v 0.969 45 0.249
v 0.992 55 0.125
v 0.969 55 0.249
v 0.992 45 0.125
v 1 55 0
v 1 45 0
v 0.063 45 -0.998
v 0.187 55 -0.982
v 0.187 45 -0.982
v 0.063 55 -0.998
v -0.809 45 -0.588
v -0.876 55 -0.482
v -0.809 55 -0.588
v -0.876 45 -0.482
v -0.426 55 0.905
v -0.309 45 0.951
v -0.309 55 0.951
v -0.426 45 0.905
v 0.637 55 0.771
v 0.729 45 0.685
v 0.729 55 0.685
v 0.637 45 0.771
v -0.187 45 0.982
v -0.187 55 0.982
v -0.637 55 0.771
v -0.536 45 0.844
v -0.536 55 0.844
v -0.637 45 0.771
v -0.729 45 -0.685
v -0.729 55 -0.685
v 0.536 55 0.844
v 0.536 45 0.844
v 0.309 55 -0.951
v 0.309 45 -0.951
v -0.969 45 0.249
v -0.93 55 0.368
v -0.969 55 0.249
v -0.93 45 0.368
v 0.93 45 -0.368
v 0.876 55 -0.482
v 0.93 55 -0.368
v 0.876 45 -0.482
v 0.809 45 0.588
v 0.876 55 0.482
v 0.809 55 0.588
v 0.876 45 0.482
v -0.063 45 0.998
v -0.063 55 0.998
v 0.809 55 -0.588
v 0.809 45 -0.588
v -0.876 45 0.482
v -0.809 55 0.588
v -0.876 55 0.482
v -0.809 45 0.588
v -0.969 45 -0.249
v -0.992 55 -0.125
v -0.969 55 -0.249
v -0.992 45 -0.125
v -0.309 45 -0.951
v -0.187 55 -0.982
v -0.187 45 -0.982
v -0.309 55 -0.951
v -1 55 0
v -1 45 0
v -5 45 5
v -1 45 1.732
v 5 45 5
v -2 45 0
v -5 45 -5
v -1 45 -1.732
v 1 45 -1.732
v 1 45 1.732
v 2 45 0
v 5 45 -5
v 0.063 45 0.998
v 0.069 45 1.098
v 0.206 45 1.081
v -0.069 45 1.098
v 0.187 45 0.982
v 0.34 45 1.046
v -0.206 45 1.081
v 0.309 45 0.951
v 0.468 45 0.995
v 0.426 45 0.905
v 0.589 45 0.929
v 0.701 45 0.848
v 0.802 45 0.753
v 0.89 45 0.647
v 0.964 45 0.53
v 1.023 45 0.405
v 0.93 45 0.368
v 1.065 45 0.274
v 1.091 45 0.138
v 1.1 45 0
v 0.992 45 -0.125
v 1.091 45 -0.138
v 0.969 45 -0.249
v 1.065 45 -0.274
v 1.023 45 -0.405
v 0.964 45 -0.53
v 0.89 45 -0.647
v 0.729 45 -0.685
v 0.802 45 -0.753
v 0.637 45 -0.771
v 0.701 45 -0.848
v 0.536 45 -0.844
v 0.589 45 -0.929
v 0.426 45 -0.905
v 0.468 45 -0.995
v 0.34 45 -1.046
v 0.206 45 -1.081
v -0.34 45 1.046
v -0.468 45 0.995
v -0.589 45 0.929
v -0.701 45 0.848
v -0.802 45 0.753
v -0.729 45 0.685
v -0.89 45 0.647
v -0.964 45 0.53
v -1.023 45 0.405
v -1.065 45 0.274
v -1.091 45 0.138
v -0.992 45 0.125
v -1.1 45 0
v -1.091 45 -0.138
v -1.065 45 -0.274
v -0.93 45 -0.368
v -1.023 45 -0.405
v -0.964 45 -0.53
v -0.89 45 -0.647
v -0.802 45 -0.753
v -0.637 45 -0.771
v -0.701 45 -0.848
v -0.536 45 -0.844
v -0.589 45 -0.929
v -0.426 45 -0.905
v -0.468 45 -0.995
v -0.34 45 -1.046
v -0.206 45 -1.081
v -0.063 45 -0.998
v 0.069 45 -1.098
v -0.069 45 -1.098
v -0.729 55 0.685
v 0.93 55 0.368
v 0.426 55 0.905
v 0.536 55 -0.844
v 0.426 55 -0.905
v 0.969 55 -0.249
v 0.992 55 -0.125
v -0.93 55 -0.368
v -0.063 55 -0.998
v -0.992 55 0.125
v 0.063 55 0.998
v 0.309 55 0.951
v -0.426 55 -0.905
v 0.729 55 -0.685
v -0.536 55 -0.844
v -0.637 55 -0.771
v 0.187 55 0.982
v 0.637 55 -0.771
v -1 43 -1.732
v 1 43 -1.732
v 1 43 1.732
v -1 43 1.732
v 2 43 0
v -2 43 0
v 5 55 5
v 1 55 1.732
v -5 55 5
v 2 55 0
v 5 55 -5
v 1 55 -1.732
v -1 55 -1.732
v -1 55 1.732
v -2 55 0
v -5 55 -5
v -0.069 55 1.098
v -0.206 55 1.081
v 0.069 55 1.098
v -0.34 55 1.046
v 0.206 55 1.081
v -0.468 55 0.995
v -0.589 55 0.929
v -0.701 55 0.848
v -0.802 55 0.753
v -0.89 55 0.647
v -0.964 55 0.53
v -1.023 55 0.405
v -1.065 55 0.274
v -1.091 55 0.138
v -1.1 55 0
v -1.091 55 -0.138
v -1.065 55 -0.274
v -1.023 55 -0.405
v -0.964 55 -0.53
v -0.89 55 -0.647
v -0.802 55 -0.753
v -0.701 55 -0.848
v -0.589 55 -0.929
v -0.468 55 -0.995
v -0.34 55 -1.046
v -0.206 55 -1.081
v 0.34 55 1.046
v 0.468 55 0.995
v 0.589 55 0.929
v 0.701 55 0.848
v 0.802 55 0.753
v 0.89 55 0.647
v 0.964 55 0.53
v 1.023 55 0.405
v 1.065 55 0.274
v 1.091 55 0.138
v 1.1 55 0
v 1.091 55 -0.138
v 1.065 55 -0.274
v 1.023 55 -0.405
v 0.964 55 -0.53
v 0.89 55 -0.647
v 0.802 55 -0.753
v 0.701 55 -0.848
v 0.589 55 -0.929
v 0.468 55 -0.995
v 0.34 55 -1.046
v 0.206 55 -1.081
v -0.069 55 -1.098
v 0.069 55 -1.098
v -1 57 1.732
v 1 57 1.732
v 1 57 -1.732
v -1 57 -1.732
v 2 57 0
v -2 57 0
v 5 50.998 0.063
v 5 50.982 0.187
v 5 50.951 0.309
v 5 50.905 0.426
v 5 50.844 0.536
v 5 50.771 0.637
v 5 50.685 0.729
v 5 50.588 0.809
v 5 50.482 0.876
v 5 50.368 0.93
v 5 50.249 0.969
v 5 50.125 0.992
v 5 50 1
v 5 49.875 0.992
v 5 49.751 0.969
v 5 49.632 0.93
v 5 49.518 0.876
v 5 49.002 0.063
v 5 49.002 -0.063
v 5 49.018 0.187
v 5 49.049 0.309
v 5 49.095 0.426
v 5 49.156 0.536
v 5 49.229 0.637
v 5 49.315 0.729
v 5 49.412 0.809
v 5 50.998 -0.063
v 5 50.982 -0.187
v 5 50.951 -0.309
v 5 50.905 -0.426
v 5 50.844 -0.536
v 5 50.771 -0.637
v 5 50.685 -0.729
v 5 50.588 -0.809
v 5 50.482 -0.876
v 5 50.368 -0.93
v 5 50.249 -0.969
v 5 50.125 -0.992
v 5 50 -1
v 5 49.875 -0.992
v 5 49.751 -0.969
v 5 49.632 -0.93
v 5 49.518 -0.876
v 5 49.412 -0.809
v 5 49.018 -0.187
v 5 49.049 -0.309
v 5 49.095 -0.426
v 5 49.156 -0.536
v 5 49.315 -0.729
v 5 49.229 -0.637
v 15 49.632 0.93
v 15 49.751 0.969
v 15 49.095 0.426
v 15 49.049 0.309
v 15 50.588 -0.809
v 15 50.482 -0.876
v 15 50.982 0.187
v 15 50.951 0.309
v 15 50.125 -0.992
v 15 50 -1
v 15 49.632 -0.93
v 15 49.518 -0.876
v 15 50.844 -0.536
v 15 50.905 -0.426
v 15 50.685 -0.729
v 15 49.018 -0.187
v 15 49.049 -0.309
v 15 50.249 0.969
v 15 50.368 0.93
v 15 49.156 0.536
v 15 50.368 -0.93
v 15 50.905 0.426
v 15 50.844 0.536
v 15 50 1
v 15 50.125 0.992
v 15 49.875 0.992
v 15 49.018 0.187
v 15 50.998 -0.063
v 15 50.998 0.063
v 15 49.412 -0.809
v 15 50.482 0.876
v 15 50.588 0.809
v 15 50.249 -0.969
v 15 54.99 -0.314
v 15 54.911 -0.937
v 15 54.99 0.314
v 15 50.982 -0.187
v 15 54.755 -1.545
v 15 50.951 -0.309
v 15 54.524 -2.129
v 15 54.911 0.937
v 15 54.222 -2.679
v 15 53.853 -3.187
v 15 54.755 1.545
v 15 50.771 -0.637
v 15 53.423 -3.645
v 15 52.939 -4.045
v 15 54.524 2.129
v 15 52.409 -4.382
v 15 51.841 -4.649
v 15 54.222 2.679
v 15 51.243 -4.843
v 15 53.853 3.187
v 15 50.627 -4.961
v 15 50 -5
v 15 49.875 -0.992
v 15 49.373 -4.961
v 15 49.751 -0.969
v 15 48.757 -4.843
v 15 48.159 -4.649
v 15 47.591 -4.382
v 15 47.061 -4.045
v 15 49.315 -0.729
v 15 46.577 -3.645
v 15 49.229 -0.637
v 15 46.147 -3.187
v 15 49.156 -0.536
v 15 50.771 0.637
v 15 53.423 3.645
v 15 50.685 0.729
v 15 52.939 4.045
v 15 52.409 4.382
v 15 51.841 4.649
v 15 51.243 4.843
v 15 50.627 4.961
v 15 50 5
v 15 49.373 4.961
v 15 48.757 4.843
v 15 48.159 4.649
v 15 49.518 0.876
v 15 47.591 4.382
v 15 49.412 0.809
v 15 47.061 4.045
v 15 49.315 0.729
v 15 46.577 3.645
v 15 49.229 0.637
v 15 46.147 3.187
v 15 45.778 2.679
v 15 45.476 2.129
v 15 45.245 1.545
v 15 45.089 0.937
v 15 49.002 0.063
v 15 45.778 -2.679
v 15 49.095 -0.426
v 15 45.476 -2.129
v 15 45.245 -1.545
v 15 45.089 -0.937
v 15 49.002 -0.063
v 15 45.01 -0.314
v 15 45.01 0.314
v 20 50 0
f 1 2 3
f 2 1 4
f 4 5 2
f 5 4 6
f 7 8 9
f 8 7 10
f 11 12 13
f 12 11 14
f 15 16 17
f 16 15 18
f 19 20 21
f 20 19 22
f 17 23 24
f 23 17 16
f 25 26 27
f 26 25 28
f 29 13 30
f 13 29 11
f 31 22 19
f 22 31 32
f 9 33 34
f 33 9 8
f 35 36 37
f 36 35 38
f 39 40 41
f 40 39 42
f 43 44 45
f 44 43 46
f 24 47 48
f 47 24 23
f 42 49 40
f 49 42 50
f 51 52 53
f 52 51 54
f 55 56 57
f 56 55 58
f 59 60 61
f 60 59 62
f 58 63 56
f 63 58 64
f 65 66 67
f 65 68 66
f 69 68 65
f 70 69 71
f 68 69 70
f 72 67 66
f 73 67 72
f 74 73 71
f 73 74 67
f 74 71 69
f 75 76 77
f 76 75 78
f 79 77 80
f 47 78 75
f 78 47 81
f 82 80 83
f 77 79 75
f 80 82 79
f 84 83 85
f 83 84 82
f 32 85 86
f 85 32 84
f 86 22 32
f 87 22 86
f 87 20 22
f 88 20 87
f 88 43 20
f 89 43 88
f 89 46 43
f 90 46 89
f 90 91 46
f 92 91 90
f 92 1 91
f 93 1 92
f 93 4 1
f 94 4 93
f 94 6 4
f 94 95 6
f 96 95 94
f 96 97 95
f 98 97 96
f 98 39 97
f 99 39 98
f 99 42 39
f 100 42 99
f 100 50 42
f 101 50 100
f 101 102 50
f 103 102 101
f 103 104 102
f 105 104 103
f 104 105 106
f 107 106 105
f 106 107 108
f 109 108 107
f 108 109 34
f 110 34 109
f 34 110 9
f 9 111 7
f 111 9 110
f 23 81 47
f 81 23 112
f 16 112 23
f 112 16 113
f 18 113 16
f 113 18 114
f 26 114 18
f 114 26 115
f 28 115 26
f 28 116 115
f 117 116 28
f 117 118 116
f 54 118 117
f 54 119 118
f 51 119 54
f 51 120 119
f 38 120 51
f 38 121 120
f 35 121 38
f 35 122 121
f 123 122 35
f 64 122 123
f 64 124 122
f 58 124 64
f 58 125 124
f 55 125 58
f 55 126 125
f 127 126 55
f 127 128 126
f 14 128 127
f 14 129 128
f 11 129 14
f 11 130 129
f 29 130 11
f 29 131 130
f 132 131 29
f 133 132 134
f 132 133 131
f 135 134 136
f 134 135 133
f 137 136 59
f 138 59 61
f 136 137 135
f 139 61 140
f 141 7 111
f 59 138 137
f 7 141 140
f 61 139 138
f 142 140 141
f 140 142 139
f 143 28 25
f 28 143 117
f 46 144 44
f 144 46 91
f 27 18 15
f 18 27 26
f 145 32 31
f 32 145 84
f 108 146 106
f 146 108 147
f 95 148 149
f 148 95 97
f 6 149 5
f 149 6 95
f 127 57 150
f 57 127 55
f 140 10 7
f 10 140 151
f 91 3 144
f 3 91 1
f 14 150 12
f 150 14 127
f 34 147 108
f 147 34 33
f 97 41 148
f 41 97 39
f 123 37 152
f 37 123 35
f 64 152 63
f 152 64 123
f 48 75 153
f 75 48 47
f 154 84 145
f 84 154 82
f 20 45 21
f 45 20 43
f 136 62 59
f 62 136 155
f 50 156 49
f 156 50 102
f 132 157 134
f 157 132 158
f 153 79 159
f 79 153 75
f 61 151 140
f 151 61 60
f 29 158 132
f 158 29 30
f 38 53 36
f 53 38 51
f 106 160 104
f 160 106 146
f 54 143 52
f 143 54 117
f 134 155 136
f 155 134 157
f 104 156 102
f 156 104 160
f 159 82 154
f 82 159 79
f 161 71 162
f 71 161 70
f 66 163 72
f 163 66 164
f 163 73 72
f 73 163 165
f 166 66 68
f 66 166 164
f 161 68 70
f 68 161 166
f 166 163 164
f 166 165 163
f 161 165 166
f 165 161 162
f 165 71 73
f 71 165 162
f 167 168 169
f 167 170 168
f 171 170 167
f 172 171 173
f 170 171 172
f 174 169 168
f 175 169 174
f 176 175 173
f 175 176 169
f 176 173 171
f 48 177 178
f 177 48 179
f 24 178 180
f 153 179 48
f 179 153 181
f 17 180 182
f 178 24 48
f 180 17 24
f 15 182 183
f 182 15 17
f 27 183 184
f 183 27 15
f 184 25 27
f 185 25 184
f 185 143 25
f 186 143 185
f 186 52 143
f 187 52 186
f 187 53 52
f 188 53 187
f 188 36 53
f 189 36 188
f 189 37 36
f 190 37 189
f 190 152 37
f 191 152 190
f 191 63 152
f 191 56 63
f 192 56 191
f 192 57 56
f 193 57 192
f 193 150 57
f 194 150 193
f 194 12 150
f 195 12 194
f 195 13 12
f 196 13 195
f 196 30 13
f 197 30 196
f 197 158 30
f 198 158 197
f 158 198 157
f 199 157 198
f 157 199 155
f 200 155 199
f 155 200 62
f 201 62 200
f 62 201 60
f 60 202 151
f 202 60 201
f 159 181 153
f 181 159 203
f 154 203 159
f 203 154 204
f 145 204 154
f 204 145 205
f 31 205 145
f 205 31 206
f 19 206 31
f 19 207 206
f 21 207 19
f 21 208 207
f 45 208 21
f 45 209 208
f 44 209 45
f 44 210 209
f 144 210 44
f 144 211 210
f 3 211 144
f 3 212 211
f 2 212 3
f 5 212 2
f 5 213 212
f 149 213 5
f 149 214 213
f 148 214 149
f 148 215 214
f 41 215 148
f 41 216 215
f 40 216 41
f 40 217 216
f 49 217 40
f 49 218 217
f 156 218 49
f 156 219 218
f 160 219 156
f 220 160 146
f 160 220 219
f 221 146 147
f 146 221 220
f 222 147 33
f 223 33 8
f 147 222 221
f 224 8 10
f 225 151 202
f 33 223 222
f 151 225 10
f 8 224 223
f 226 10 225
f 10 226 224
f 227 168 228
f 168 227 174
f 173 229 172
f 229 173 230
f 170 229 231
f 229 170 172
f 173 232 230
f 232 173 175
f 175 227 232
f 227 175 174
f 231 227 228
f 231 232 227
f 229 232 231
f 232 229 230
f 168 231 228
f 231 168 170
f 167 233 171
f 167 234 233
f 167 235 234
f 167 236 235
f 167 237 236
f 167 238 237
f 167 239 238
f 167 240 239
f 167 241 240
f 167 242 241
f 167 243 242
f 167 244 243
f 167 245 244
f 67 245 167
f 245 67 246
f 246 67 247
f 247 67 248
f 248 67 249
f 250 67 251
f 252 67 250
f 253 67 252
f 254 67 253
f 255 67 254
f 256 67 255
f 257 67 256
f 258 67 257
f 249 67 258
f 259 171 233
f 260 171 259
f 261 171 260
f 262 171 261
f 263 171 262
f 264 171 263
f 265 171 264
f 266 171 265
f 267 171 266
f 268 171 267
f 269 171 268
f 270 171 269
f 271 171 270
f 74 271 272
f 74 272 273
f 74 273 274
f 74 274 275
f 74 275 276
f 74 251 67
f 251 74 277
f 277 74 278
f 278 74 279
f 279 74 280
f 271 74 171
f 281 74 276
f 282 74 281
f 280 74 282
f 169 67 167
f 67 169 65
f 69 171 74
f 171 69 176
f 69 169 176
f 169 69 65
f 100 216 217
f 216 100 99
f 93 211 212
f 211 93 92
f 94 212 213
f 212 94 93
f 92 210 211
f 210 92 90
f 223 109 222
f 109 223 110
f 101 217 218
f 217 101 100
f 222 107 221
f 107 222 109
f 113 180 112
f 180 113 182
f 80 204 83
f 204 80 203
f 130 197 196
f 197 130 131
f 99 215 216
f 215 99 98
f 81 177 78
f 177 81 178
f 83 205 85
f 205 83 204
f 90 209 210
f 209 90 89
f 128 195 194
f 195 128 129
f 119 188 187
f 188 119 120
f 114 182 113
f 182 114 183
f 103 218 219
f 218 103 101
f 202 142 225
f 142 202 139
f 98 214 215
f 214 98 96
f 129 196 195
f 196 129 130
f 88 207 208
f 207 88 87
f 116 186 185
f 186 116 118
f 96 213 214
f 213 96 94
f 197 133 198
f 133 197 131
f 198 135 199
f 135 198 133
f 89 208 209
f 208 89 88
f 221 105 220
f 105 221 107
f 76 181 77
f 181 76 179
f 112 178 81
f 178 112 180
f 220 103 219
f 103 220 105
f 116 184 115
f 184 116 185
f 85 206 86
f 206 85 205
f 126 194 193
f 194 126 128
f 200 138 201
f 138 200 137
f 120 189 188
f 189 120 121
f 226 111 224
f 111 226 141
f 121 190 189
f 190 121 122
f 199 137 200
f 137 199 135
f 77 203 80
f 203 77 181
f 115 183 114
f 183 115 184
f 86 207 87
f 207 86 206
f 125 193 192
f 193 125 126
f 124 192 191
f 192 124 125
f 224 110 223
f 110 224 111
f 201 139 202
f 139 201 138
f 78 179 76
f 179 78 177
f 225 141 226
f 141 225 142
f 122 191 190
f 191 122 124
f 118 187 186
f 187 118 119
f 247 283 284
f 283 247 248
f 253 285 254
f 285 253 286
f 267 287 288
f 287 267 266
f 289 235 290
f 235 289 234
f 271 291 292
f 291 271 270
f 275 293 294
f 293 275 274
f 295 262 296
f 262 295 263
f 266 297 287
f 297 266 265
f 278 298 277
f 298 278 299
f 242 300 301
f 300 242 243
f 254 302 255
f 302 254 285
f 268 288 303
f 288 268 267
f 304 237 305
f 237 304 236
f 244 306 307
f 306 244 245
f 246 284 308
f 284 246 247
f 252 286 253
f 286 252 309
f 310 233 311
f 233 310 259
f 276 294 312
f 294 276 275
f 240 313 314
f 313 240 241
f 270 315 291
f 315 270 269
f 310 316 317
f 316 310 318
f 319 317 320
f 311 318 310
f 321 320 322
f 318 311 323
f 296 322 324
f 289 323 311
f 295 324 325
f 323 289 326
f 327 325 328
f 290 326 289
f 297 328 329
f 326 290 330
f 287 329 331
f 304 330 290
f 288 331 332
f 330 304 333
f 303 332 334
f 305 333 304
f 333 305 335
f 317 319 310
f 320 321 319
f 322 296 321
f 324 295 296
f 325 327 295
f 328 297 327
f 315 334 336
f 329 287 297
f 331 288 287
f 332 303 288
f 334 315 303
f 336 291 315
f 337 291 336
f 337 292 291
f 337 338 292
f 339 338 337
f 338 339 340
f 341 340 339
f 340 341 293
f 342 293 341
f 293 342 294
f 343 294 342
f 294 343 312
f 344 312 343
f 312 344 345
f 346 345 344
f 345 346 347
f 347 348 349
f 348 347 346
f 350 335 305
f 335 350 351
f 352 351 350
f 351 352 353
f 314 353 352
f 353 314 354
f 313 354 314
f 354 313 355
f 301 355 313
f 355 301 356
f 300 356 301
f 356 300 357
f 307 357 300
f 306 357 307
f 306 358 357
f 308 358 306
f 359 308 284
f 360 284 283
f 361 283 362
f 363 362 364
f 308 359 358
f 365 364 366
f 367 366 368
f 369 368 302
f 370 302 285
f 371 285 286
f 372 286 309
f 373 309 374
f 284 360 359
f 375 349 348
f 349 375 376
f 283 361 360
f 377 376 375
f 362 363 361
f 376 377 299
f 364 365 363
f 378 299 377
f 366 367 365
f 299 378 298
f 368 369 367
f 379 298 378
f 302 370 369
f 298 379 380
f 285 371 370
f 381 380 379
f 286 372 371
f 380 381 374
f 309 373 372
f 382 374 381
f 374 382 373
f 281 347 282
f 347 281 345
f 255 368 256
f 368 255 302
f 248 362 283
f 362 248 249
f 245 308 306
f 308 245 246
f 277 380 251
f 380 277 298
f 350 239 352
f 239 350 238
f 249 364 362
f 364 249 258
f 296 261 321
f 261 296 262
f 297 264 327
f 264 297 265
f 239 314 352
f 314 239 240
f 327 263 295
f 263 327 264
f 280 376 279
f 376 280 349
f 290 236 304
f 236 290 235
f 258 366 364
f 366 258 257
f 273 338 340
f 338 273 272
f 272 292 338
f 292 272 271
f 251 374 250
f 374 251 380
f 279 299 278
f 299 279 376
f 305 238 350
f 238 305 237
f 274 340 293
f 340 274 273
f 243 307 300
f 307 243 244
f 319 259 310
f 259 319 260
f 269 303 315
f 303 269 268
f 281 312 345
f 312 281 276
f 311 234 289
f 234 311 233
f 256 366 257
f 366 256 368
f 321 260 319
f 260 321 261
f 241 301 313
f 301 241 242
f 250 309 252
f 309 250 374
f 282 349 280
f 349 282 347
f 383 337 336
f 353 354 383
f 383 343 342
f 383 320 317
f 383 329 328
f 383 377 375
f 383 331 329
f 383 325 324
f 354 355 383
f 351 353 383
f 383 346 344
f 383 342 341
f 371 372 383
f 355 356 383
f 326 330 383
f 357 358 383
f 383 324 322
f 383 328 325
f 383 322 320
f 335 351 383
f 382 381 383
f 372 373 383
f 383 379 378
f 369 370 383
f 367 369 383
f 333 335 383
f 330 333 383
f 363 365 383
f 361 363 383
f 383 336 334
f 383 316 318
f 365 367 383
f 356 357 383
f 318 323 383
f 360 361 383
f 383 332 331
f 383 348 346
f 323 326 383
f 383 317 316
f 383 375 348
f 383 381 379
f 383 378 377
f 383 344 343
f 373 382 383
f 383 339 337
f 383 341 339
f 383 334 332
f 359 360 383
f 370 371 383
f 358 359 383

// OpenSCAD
$fn = 50;

yA = [$t * 10, 0, 0];
xA = [0, $t * 20, 0];

y = [10, 0, 0];
x = [0, 10, 0];
z = [0, 0, 10];

/**
/ ASSEMBLY
**/

translate([0, 50, 0]) {
    explode(xA, center=true, enable=true) {
        part1();
        rotate([180, 0, 0]) part1();
    }
    explode(yA, center=true, enable=true) {
        part2();
        part3();
        part4();
    }
}

/**
/ Sub-Assemblies
**/

module part1() {
    translate([0, 0, 0]) rotate([90, 0, 0]) cylinder(5);
    translate([0, -5, 0]) rotate([90, 0, 0]) cylinder(r=2, h=2, $fn=6);
}

module part2() {
    difference() {
        cube(10, center=true);
        rotate([90, 0, 0]) cylinder(r=1.1, h=11, center=true);
    }
}

module part3() {
    translate([10, 0, 0]) rotate([0, 90, 0]) cylinder(10, center=true);
}

module part4() {
    translate([15, 0, 0]) rotate([0, 90, 0]) cylinder(r1=5, r2=0, h=5);
}
module explode(distance, center, enable) {
    if ( (enable) && (!center)) {

        for (i = [0:1:$children - 1]) // step needed in case $children < 2
        translate([i * distance[0], i * distance[1], i * distance[2]]) {
            children(i);
        }
    }

    //CENTERED

    if ( (enable) && (center)) {
        count = $children - 1;
        explode_start = ([(count * distance[0]) / 2 * -1, (count * distance[1]) / 2 * -1, (count * distance[2]) / 2 * -1]);

        for (i = [0:1:$children - 1]) // step needed in case $children < 2
        translate(explode_start) {
            translate([i * distance[0], i * distance[1], i * distance[2]]) {
                children(i);
            }
        }
    }

    //NOT ENABLED - Include un-altered children

    if (!enable) {
        for (i = [0:1:$children - 1]) {
            // step needed in case $children < 2

            children(i);
        }
    }
}
